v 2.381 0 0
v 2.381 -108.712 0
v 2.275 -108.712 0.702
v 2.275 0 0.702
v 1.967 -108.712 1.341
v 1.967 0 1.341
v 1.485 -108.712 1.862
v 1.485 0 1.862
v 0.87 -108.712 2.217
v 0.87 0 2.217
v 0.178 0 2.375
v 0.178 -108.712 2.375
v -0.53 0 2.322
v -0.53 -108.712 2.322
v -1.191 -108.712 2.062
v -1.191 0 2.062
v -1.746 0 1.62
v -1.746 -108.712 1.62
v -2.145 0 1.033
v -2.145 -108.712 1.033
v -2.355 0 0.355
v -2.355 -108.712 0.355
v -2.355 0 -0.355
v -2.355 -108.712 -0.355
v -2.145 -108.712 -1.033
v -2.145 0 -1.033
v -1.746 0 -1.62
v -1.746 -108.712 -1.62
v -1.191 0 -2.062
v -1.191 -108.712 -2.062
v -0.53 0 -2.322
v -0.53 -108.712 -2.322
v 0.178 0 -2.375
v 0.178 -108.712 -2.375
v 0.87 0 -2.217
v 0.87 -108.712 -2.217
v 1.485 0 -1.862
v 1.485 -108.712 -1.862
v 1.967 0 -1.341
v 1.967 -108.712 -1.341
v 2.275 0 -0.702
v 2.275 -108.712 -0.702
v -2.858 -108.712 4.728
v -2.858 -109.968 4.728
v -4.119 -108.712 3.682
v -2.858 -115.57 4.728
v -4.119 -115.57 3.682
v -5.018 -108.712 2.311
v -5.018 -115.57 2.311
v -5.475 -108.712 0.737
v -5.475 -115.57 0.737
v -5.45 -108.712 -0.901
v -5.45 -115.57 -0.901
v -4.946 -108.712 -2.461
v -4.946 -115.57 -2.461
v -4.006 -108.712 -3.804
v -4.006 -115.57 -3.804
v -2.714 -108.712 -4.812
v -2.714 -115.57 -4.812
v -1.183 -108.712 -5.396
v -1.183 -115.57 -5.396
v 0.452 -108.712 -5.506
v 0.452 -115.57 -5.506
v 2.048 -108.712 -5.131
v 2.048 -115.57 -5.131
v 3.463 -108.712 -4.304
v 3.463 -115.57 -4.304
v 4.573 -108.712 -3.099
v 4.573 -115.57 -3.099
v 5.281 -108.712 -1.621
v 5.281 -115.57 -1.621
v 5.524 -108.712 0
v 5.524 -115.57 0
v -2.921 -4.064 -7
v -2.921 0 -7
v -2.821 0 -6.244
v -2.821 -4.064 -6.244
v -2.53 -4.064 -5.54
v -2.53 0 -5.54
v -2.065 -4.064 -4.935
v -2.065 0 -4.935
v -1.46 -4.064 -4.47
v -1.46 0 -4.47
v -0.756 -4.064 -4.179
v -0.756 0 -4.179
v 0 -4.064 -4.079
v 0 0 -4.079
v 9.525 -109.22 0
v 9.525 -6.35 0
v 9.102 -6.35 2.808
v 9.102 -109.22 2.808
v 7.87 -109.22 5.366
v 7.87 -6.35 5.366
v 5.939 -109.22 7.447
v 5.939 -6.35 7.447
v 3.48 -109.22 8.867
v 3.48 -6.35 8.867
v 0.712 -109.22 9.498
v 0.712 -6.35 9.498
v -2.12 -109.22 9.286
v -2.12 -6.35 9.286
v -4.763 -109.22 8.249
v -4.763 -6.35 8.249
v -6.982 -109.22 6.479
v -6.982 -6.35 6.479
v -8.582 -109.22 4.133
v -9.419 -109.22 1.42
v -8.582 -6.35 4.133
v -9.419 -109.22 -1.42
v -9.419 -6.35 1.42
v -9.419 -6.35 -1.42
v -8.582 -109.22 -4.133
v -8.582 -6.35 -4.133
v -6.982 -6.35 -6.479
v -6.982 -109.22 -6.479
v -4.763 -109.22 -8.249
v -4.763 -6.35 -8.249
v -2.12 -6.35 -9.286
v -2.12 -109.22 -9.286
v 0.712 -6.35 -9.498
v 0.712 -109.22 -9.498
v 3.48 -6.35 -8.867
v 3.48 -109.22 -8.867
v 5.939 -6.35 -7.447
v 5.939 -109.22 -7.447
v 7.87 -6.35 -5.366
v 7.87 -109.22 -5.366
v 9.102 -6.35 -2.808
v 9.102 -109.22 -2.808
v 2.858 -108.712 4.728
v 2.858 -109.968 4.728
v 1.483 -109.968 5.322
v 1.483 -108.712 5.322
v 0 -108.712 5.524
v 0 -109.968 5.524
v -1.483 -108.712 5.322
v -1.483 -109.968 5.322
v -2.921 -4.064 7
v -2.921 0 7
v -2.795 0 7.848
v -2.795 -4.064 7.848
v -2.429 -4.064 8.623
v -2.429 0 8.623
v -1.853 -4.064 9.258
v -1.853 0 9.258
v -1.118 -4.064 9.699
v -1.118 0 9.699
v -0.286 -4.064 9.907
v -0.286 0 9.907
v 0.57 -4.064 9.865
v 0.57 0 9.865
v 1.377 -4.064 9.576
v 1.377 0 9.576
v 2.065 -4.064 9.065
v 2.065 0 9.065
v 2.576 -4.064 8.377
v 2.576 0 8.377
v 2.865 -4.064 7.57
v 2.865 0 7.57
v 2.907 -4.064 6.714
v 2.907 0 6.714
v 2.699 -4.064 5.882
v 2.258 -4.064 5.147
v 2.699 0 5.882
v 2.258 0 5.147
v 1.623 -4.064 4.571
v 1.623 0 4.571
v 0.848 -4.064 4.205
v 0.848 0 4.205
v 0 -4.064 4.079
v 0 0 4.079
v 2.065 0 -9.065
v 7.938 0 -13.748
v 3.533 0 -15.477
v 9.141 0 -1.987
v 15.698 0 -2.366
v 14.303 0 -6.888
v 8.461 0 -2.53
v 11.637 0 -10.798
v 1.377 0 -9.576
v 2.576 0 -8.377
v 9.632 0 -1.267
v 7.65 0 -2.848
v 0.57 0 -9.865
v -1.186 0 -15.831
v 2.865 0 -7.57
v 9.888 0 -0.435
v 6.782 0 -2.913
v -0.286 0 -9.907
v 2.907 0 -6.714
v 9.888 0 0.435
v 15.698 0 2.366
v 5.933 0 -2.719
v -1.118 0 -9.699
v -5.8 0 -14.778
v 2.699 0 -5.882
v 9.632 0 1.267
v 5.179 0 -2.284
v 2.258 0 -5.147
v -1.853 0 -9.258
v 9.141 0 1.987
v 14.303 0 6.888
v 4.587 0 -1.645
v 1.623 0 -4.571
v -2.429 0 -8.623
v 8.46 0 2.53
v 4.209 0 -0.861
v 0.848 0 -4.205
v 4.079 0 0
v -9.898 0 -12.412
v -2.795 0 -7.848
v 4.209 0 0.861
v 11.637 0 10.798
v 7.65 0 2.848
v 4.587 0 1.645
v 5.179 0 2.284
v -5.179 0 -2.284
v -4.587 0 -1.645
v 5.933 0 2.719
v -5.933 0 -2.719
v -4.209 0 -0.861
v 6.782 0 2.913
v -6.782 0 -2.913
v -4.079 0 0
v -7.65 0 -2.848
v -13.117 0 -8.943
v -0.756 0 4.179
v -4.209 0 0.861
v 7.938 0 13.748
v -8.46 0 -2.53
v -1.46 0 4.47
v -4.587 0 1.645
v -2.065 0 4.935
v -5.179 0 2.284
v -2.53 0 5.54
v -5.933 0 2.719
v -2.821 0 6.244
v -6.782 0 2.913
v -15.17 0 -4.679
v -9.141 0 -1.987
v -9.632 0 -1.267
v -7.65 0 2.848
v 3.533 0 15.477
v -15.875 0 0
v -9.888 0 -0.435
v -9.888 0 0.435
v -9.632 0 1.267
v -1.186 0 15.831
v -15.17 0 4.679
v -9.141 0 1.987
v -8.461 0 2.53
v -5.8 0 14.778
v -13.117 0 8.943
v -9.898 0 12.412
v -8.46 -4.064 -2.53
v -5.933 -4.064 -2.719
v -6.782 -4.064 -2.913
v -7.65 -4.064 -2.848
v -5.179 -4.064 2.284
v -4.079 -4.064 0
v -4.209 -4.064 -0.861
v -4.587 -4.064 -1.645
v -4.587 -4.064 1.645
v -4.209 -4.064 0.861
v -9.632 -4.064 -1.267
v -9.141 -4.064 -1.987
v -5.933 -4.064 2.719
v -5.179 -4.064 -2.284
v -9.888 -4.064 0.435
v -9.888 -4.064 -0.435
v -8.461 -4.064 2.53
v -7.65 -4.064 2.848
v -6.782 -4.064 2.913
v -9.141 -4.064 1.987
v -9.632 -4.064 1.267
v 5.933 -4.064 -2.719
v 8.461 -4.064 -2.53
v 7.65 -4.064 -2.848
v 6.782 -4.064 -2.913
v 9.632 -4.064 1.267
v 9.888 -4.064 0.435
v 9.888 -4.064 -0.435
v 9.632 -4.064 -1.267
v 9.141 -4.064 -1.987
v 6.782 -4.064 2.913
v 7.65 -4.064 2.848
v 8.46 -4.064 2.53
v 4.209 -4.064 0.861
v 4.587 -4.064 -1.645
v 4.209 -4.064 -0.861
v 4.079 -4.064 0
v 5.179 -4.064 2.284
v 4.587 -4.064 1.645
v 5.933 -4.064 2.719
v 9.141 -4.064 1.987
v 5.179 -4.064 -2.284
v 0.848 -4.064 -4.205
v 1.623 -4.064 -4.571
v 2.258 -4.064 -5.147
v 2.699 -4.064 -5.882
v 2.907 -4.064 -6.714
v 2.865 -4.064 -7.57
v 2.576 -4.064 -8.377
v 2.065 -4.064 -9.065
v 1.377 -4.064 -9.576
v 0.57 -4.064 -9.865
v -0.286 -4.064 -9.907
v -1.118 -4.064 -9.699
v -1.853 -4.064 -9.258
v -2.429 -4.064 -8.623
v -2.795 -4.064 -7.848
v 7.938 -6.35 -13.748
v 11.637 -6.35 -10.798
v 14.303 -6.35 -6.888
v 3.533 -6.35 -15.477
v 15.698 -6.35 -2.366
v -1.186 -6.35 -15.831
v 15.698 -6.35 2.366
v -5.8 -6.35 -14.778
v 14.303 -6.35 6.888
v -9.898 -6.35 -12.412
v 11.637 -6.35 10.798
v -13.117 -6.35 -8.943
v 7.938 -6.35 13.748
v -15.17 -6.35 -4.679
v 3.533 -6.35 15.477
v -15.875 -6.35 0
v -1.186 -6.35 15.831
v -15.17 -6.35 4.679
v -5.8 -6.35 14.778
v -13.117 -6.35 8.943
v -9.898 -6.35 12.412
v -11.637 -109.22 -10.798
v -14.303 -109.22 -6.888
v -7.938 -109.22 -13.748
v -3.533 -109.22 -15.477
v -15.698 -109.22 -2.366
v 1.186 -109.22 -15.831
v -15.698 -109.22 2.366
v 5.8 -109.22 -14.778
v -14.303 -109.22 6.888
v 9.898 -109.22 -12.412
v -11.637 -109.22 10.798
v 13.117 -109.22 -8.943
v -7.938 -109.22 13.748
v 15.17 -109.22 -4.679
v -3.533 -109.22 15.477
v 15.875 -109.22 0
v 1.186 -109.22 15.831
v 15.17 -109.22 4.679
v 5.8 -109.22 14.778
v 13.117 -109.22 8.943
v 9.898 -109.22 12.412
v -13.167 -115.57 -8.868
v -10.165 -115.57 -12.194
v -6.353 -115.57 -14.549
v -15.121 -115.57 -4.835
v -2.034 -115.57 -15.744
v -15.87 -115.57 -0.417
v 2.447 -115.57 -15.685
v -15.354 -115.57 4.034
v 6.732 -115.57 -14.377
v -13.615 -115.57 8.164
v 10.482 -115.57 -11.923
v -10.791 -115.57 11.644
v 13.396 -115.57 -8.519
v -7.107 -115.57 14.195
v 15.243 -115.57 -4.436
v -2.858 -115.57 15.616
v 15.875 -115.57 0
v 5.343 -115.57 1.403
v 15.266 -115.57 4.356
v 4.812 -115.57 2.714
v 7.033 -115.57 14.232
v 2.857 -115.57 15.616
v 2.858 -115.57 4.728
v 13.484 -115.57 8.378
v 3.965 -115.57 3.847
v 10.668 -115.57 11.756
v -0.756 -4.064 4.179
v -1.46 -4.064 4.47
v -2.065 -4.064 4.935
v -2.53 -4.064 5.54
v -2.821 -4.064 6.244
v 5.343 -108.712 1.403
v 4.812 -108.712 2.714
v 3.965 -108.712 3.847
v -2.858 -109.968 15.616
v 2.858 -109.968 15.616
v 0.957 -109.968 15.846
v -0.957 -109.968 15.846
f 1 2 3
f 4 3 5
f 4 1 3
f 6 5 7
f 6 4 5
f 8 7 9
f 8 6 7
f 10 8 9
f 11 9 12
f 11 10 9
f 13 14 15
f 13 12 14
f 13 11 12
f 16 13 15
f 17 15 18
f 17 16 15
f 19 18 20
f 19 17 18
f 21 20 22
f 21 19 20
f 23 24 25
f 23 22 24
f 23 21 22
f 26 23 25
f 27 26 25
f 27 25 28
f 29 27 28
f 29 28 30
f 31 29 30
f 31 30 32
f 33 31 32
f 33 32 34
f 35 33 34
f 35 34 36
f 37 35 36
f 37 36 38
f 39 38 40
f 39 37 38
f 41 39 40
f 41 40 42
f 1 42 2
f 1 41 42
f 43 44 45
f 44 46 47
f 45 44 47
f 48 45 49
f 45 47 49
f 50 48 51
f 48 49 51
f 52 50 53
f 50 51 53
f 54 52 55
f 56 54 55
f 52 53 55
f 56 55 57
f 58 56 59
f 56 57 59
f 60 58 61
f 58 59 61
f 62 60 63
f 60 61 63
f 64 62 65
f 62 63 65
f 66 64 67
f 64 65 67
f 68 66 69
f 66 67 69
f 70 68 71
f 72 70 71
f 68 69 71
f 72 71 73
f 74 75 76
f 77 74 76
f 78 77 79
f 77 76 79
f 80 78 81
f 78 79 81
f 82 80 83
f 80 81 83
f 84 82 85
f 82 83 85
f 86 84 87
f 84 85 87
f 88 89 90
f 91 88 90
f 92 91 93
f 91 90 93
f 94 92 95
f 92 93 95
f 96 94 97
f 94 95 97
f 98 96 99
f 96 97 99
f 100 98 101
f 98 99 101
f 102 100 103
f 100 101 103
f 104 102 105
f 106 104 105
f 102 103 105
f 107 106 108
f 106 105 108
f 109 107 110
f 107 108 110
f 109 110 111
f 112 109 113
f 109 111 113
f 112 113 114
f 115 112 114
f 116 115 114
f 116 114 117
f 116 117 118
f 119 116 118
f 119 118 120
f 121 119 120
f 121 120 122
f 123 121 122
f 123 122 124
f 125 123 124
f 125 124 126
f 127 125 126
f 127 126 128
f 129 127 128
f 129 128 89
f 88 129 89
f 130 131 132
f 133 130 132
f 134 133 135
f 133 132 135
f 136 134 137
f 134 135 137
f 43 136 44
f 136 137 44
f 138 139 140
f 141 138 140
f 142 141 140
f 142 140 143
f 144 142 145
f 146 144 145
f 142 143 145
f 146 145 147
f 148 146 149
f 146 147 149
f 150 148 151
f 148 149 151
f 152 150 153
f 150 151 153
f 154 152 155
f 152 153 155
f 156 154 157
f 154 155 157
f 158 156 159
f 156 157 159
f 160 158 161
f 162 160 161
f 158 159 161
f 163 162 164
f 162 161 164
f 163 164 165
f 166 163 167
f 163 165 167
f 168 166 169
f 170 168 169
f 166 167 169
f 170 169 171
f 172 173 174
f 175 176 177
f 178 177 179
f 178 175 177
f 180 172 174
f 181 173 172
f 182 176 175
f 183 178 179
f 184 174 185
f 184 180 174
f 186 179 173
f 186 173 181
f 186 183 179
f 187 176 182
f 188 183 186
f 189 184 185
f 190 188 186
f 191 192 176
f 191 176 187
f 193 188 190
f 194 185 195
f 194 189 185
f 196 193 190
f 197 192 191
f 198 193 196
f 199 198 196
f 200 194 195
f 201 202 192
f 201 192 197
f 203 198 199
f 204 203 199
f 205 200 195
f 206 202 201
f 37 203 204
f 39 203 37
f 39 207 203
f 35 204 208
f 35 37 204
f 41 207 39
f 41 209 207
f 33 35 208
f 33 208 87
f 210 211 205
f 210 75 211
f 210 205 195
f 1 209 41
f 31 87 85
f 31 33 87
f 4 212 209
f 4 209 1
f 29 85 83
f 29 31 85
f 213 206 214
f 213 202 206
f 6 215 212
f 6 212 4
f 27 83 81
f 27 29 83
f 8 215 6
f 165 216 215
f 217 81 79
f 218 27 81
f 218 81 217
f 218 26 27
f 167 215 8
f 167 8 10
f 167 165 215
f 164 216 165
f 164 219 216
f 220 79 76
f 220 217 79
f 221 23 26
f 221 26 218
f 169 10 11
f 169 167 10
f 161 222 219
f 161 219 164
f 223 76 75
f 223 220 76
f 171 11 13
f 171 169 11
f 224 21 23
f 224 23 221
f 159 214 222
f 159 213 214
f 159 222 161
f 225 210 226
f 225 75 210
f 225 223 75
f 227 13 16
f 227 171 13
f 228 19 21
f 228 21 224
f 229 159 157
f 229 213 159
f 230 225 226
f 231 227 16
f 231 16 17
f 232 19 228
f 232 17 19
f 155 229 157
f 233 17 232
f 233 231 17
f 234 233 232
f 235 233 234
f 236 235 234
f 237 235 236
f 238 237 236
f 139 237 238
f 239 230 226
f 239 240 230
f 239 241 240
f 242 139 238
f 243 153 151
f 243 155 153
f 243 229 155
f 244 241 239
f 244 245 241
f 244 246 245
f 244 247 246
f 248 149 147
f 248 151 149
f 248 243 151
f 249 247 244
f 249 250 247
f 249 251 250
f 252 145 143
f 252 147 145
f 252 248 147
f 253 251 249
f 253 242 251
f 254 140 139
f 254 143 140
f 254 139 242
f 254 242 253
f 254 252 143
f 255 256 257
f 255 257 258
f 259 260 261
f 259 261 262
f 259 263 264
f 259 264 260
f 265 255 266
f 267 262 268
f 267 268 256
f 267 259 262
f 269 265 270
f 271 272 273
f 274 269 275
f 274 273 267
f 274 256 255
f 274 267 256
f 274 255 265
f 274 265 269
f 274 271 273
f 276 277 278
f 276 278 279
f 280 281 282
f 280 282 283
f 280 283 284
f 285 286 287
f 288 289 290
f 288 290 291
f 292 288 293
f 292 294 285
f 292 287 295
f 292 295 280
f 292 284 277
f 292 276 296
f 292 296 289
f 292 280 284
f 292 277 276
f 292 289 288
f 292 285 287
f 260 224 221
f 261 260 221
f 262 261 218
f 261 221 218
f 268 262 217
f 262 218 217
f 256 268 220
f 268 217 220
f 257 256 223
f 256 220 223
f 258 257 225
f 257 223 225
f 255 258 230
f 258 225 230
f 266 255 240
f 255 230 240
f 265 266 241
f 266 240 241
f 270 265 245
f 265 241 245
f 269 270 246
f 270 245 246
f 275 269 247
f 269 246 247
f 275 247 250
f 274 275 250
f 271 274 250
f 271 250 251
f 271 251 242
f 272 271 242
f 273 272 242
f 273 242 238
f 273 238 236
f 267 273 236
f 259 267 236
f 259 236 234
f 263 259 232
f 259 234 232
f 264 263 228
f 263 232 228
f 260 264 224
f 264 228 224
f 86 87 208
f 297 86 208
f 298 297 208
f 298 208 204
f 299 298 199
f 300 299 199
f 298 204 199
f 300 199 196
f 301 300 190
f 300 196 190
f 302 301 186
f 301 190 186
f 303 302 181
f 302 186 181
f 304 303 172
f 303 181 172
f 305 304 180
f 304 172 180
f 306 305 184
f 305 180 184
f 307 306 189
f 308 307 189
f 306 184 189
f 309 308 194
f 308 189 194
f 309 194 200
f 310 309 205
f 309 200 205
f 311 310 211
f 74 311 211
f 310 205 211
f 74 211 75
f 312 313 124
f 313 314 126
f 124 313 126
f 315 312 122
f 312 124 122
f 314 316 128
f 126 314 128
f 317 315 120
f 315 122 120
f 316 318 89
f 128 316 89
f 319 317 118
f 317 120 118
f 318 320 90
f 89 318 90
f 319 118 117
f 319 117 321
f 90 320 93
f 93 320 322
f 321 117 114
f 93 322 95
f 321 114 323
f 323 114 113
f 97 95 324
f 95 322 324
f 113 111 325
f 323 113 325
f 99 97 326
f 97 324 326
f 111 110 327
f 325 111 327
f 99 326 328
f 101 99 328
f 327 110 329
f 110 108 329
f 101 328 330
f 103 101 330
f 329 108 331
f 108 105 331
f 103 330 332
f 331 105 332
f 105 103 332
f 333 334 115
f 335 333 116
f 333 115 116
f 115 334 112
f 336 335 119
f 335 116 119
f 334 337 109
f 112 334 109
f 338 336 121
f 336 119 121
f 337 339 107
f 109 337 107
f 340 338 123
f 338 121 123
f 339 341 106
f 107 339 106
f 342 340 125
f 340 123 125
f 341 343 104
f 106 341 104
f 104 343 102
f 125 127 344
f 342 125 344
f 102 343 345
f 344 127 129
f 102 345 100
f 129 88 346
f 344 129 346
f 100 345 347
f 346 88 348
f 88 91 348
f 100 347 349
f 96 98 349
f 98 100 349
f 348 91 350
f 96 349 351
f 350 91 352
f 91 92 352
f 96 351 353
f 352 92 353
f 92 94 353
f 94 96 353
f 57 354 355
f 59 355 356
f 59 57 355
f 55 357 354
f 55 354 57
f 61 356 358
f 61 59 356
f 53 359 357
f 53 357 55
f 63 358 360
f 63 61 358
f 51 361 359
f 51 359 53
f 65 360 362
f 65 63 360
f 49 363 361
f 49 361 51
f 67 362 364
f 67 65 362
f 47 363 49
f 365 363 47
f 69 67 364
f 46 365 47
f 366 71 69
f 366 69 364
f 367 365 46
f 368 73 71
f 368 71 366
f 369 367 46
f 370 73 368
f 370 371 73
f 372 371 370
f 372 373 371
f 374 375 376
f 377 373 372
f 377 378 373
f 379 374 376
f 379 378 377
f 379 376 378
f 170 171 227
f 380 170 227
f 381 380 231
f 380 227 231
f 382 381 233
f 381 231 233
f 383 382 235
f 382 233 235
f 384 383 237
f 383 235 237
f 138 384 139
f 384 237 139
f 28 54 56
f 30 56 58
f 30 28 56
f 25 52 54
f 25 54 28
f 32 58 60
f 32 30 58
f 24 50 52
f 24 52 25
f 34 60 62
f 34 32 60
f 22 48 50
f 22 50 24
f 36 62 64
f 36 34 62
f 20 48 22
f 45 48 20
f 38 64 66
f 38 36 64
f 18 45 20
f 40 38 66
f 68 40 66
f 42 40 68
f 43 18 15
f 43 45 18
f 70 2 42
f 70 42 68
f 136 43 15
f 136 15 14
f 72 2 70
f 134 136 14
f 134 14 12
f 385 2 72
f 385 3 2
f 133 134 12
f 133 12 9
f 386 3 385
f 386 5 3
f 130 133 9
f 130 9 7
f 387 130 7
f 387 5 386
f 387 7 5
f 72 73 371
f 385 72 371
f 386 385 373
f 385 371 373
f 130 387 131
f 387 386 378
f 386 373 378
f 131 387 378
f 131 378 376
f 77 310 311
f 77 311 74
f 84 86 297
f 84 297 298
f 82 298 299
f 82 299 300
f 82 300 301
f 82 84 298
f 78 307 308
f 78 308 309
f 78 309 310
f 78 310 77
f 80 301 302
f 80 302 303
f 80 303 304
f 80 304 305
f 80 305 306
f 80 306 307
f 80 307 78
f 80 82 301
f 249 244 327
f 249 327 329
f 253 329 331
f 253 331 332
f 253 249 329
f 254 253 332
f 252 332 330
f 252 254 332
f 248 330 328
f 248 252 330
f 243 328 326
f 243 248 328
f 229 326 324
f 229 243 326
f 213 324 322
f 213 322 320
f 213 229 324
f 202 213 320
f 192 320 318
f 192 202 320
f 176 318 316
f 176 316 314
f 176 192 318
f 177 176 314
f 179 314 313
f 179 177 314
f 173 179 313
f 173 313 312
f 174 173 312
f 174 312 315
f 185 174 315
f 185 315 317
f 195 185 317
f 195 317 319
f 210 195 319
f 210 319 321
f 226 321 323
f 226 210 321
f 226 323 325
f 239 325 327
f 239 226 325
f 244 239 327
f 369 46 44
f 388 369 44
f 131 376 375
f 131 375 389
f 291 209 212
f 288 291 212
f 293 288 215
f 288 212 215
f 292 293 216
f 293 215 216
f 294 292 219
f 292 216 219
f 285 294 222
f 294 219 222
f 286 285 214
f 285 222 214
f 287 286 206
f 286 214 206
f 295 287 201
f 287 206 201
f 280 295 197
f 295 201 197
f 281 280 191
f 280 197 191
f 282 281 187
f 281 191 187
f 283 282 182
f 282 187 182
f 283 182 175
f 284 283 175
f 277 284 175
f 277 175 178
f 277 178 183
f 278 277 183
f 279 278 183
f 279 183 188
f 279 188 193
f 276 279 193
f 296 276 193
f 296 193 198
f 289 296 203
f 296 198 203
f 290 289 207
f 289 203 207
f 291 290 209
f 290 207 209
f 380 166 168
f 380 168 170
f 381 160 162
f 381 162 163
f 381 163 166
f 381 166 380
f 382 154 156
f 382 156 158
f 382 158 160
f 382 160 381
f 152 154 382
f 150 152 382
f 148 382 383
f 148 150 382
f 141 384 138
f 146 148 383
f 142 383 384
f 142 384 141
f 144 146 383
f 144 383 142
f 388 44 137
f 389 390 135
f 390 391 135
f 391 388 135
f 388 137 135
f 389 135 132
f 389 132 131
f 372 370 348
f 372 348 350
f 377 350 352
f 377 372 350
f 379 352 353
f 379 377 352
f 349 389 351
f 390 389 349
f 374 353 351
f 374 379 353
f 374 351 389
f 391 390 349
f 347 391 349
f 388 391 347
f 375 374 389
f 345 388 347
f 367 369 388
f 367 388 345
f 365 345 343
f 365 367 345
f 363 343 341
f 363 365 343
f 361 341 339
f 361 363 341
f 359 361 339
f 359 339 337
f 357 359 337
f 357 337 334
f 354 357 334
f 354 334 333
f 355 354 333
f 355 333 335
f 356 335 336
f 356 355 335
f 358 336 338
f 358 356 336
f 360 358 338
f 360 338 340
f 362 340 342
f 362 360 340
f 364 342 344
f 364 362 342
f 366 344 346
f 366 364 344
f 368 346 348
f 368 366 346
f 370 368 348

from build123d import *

# Parameters (mm, degrees)
F0_R      = 9.525
F0_R_2    = 2.38125
F1_DEPTH  = 115.57
F2_R      = 15.875
F2_R_2    = 9.525
F3_DEPTH  = 6.35
F4_R      = 2.921
F5_DEPTH  = 4.064
F6_R      = 15.875
F6_R_2    = 9.525
F7_DEPTH  = 6.35
F8_W      = 5.715
F8_H      = 5.842
F9_DEPTH  = 34.4932
F11_DEPTH = 6.858


with BuildPart() as f1:
    # F0 (on Front) → F1 (new body)
    with BuildSketch(Plane.XZ):
        Circle(F0_R)
        Circle(F0_R_2, mode=Mode.SUBTRACT)
    extrude(amount=F1_DEPTH)

    # F2 (on face) → F3 (join)
    with BuildSketch(Plane(origin=(0, 0, 0), x_dir=(-1, 0, 0), z_dir=(0, 1, 0))):
        Circle(F2_R)
        Circle(F2_R_2, mode=Mode.SUBTRACT)
    extrude(amount=-F3_DEPTH)

    # F4 (on face) → F5 (cut)
    with BuildSketch(Plane(origin=(0, 0, 0), x_dir=(-1, 0, 0), z_dir=(0, 1, 0))):
        with BuildLine():
            ThreePointArc((2.921, 7), (-2.0654589078, 9.0654589078), (0, 4.079))
            ThreePointArc((0, 4.079), (2.0654589078, 4.9345410922), (2.921, 7))
        make_face()
        with Locations((-7, 0)):
            Circle(F4_R)
        with BuildLine():
            ThreePointArc((2.921, -7), (2.0654589078, -4.9345410922), (0, -4.079))
            ThreePointArc((0, -4.079), (-2.0654589078, -9.0654589078), (2.921, -7))
        make_face()
        with BuildLine():
            ThreePointArc((9.921, 0), (7, 2.921), (4.079, 0))
            ThreePointArc((4.079, 0), (7, -2.921), (9.921, 0))
        make_face()
    extrude(amount=-F5_DEPTH, mode=Mode.SUBTRACT)

    # F6 (on face) → F7 (join)
    with BuildSketch(Plane.XZ.offset(115.57)):
        Circle(F6_R)
        Circle(F6_R_2, mode=Mode.SUBTRACT)
    extrude(amount=-F7_DEPTH)

    # F8 (on Top) → F9 (cut)
    with BuildSketch(Plane.XY):
        with Locations((0, -112.8891035914)):
            Rectangle(F8_W, F8_H)
    extrude(amount=F9_DEPTH, mode=Mode.SUBTRACT)

    # F10 (on face) → F11 (cut)
    with BuildSketch(Plane.XZ.offset(115.57)):
        with BuildLine():
            Line((2.8575, 0), (2.8575, 4.7280856591))
            ThreePointArc((2.8575, 4.7280856591), (0, 5.5245), (-2.8575, 4.7280856591))
            Line((-2.8575, 4.7280856591), (-2.8575, 0))
            Line((-2.8575, 0), (-2.38125, 0))
            ThreePointArc((-2.38125, 0), (0, -2.38125), (2.38125, 0))
            Line((2.38125, 0), (2.8575, 0))
        make_face()
        with BuildLine():
            ThreePointArc((-2.8575, 4.7280856591), (-2.7142072047, -4.8117750883), (5.5245, 0))
            ThreePointArc((5.5245, 0), (4.8117750883, 2.7142072047), (2.8575, 4.7280856591))
            Line((2.8575, 4.7280856591), (2.8575, 0))
            Line((2.8575, 0), (2.38125, 0))
            ThreePointArc((2.38125, 0), (0, -2.38125), (-2.38125, 0))
            Line((-2.38125, 0), (-2.8575, 0))
            Line((-2.8575, 0), (-2.8575, 4.7280856591))
        make_face()
    extrude(amount=-F11_DEPTH, mode=Mode.SUBTRACT)


solid = f1.part
